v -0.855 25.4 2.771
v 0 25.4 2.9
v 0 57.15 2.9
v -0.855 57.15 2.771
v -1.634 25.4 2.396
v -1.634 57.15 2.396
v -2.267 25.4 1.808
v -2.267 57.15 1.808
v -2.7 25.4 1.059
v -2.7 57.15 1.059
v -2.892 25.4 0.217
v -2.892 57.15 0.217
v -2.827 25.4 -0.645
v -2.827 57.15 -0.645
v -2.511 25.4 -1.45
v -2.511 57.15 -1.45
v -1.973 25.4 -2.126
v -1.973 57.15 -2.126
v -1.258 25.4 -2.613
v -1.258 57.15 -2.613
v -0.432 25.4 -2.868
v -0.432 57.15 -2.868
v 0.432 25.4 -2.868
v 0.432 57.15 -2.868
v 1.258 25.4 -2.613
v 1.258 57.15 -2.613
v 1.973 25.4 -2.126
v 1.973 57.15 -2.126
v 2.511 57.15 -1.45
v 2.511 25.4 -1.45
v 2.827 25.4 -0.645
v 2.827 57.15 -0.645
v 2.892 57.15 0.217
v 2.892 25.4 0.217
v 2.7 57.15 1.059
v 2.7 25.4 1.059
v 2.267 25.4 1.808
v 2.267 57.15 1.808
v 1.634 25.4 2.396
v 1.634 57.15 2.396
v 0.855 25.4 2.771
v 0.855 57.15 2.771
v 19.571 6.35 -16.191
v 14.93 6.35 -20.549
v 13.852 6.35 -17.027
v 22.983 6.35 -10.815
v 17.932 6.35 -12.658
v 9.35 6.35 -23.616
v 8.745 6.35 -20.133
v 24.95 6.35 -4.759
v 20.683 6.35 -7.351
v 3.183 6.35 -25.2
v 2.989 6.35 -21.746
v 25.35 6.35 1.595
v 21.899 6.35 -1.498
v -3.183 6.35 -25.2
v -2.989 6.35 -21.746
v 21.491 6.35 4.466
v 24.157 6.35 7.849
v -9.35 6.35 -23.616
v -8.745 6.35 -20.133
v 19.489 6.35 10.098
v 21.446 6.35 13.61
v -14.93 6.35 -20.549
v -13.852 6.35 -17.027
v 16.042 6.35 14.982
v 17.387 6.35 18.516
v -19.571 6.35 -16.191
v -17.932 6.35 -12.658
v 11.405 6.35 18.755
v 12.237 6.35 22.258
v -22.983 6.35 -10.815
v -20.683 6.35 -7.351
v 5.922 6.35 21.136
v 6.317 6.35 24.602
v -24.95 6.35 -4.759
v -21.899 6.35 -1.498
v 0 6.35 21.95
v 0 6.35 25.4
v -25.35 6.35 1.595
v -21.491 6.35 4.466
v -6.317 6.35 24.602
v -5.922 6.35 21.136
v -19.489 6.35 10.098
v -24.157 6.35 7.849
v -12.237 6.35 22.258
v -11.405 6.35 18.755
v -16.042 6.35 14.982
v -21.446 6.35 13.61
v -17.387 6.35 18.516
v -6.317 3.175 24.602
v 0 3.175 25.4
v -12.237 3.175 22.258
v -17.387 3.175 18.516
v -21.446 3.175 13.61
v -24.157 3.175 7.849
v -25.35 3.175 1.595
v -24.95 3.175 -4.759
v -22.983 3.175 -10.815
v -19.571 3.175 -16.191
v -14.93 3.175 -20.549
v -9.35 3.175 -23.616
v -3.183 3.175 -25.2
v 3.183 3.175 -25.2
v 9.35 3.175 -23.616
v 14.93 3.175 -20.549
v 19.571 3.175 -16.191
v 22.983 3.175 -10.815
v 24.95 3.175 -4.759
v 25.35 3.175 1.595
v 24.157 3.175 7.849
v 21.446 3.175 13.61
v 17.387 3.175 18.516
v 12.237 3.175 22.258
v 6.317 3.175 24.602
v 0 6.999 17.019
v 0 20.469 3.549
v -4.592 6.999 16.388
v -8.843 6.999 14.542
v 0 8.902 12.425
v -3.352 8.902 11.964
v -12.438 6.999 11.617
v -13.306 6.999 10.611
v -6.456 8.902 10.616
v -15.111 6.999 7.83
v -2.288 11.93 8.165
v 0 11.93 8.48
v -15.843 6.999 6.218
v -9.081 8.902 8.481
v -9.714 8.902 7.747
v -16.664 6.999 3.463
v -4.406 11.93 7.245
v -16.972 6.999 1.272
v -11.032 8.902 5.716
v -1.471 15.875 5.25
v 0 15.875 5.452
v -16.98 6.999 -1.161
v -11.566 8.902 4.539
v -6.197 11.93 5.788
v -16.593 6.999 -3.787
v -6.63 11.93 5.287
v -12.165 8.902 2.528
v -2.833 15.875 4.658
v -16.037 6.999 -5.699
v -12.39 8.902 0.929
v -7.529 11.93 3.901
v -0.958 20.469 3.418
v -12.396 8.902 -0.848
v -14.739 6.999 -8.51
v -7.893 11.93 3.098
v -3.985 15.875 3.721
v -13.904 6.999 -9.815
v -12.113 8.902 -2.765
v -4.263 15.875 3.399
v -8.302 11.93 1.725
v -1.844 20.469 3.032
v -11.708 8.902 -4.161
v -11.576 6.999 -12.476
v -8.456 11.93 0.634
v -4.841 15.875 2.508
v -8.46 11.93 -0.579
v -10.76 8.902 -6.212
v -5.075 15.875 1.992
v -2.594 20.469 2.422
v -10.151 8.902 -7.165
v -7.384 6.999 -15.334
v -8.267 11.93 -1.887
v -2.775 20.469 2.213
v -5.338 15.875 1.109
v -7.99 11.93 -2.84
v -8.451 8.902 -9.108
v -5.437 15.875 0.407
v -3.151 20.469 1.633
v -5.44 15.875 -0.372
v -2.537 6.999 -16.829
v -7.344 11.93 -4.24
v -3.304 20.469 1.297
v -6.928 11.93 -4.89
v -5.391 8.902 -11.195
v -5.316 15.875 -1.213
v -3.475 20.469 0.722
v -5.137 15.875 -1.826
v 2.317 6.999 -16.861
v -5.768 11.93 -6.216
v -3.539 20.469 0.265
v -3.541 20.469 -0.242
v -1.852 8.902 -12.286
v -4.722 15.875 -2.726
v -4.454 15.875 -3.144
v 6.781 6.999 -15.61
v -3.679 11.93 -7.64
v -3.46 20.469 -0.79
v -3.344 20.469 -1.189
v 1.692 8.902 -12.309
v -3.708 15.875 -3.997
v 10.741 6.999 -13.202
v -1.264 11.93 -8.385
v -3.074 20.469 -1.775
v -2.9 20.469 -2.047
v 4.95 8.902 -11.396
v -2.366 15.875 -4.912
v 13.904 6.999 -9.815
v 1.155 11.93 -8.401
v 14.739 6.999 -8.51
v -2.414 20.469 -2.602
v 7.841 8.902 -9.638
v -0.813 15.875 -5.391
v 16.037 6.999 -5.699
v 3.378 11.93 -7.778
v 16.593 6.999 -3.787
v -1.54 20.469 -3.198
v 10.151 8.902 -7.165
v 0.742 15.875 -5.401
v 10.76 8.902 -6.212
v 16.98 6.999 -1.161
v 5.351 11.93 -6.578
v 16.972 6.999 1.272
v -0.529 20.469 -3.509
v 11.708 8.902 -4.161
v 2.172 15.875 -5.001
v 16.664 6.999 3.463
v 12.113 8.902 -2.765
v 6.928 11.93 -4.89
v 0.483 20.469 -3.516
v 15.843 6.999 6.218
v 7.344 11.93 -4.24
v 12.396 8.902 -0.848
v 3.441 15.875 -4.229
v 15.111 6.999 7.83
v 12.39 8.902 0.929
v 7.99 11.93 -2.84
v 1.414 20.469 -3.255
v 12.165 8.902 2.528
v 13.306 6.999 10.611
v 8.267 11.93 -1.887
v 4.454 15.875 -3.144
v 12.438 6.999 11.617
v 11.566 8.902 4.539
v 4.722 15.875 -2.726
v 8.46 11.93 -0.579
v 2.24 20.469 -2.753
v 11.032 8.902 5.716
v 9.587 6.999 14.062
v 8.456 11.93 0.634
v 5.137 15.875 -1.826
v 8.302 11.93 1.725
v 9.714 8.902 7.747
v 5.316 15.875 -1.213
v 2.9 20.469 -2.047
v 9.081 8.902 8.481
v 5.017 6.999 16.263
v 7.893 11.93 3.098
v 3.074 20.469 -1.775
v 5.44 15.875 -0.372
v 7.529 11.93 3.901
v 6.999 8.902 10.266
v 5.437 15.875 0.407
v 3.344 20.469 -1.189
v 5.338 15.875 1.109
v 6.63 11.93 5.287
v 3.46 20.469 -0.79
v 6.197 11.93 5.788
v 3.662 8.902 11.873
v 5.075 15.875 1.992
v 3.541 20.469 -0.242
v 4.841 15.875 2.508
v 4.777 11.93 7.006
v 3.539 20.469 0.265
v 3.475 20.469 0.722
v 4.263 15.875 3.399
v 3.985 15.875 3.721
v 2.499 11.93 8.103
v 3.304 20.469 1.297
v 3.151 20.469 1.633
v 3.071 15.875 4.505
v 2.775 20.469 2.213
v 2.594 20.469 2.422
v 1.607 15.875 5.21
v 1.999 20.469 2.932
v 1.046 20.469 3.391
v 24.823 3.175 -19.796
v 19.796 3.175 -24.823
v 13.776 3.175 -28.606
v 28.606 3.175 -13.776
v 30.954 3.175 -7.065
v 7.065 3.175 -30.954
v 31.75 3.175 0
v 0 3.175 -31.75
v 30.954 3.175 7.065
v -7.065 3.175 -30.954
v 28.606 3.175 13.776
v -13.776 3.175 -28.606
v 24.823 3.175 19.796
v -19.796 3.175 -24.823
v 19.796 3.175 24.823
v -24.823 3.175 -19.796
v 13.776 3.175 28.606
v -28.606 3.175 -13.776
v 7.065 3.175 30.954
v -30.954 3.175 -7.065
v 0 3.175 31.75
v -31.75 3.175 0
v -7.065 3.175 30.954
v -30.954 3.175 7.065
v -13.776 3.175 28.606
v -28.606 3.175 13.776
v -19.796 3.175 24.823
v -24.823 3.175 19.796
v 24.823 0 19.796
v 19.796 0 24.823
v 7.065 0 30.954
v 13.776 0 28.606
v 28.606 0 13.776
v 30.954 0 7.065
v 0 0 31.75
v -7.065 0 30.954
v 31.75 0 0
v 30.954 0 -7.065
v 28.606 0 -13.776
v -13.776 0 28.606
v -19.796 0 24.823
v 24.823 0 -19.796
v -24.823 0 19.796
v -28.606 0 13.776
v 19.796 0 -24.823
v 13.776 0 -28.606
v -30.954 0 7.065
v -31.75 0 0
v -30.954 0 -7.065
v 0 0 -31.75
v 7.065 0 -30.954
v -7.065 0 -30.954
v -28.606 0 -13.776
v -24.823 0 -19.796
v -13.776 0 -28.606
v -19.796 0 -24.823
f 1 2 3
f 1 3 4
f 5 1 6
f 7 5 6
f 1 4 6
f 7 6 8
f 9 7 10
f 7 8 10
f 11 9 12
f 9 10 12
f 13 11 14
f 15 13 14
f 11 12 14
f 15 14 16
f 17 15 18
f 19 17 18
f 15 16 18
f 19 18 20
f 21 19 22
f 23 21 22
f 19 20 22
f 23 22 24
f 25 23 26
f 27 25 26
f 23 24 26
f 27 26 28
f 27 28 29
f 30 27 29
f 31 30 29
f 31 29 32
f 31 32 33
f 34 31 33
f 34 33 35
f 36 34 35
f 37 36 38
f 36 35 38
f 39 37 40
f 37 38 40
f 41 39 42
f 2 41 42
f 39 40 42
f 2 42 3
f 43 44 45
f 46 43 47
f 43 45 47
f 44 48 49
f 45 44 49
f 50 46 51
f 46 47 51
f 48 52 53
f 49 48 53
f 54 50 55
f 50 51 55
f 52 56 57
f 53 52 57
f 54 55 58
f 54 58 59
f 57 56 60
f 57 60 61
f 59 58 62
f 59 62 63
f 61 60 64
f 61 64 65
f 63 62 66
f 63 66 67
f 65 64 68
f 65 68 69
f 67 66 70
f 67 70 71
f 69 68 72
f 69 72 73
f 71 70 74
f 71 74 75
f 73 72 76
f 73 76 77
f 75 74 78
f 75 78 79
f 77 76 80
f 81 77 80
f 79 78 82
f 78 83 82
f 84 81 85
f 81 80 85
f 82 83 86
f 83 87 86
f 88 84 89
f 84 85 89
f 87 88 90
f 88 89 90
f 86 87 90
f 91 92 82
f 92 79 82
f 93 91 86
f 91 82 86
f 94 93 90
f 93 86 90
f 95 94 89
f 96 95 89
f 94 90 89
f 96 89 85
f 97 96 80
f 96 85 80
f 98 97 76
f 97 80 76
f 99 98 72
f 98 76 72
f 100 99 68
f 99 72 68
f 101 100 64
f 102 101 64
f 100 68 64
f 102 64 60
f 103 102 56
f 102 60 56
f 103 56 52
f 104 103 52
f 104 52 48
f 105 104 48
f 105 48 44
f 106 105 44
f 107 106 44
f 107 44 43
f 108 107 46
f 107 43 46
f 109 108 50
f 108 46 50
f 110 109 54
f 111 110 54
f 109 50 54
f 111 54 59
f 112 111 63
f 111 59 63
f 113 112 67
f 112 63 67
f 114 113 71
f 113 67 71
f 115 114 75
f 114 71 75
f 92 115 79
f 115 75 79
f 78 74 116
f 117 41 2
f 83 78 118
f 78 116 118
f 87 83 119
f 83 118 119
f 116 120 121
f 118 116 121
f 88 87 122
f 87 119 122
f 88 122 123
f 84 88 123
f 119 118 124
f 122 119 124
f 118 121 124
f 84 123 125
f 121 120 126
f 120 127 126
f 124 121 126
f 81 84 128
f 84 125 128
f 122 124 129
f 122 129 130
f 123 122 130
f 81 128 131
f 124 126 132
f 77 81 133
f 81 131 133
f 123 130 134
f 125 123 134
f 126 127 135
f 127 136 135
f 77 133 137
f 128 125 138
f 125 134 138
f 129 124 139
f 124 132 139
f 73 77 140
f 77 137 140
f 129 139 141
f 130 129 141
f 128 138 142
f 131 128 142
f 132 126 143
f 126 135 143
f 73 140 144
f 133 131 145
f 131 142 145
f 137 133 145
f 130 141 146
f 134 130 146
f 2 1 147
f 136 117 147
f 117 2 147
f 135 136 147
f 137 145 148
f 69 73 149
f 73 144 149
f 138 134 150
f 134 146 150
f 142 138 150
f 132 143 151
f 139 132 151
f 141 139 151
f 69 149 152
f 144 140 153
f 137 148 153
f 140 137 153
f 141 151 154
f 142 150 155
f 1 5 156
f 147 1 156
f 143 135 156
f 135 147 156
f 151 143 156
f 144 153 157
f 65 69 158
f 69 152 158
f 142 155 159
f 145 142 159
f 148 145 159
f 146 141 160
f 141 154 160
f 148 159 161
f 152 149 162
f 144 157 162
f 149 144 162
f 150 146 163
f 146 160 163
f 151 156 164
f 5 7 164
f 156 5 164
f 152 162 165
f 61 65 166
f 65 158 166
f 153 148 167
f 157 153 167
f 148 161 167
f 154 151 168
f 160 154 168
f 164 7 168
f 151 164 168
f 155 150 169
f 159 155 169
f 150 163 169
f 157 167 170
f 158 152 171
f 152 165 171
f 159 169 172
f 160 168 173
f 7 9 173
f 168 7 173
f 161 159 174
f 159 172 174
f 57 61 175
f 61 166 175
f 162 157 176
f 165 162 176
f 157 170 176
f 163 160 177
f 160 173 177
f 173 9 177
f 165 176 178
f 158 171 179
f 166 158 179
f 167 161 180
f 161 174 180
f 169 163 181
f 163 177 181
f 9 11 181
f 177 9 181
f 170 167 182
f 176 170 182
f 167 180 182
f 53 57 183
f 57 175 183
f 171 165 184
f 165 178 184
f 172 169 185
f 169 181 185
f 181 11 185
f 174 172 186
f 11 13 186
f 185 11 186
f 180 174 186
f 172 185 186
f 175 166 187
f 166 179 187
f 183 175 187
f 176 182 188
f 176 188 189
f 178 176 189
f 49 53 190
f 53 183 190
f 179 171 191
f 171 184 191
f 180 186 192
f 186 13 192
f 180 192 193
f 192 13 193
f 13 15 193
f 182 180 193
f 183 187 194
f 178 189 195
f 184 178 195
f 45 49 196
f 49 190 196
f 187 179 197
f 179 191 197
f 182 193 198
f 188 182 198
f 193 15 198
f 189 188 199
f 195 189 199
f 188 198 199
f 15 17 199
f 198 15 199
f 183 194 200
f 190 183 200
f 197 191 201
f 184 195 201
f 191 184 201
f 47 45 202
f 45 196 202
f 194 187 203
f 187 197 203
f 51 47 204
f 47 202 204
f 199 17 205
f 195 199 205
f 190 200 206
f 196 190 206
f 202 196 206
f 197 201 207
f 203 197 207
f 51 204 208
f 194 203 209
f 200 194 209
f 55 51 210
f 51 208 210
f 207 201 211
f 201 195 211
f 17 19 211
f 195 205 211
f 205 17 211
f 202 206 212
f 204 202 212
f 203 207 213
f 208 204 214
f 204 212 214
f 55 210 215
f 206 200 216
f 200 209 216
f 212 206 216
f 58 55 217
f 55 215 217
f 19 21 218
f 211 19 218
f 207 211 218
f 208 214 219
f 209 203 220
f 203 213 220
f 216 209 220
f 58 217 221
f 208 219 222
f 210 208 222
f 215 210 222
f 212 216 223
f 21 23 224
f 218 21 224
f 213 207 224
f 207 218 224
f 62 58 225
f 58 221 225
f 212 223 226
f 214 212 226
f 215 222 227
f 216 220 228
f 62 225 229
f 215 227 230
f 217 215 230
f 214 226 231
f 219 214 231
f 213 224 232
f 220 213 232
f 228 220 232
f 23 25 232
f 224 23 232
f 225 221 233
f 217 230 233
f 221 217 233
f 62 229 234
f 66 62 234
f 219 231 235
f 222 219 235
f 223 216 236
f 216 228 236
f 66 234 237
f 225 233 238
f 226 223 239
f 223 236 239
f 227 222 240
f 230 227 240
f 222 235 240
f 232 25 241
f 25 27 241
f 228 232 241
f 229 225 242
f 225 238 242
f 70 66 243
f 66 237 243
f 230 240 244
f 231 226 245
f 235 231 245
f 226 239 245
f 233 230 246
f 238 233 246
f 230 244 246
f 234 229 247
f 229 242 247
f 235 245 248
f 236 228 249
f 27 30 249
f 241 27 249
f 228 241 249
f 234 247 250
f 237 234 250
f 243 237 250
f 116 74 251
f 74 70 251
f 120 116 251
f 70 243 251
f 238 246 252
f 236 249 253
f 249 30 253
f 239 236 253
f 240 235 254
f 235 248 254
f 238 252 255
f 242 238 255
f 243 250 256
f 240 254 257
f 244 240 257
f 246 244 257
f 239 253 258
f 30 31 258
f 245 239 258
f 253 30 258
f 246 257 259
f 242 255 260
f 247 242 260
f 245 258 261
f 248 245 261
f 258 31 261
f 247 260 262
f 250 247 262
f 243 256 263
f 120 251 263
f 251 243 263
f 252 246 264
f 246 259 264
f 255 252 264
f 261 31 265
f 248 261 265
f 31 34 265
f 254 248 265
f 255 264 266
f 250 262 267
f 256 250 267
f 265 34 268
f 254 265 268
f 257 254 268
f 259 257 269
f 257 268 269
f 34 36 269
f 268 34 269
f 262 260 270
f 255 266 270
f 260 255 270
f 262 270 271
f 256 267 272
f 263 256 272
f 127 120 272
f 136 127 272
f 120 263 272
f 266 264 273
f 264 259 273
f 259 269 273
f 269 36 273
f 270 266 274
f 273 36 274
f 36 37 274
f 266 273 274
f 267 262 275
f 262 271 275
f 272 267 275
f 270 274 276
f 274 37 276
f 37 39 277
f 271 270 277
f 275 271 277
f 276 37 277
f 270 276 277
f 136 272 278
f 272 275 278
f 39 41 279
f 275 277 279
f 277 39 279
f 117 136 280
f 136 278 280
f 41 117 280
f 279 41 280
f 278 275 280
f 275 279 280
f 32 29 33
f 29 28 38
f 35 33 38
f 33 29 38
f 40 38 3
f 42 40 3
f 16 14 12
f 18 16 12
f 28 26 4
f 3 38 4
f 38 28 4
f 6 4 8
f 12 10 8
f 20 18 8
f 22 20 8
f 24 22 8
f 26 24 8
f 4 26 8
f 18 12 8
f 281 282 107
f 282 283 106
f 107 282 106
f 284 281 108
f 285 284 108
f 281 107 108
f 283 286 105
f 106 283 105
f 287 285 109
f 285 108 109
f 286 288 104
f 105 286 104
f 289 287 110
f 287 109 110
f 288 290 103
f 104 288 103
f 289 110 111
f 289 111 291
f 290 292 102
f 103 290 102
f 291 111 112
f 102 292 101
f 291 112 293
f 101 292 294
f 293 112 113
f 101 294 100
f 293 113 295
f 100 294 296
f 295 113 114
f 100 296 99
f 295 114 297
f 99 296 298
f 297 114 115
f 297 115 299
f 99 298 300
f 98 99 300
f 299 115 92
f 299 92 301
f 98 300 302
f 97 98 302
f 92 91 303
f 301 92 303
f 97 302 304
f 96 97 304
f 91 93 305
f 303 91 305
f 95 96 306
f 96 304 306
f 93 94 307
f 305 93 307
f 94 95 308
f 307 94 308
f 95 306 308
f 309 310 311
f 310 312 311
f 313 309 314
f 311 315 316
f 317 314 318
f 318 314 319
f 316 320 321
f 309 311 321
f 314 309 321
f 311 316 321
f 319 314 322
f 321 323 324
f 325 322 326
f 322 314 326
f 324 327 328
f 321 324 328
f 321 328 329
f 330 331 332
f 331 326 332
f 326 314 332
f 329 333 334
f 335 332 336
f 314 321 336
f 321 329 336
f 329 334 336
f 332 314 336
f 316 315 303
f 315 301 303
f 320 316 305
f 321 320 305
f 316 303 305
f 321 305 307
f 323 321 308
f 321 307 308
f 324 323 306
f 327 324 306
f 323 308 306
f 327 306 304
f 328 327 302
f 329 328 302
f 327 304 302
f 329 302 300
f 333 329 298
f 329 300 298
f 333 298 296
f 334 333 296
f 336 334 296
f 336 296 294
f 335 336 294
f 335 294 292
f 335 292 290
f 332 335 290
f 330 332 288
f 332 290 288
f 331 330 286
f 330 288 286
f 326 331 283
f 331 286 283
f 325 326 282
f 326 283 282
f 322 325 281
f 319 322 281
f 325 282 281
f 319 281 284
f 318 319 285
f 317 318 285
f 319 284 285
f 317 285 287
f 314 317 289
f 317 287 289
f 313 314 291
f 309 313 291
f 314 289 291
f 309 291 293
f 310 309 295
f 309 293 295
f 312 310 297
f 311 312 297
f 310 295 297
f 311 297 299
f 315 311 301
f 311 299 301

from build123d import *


with BuildPart() as part:
    # Sketch1 → Revolve1 (revolve)
    with BuildSketch(Plane.XY, mode=Mode.PRIVATE) as revolve1_sk:
        with BuildLine():
            Line((0, 0), (31.75, 0))
            Line((31.75, 0), (31.75, 3.175))
            Line((31.75, 3.175), (25.4, 3.175))
            Line((25.4, 3.175), (25.4, 6.35))
            Line((25.4, 6.35), (21.95, 6.35))
            ThreePointArc((21.95, 6.35), (8.479615818, 11.929615818), (2.9, 25.4))
            Line((2.9, 25.4), (2.9, 57.15))
            Line((2.9, 57.15), (0, 57.15))
            Line((0, 57.15), (0, 0))
        make_face()
    revolve(revolve1_sk.sketch.rotate(Axis((0, 0, 0), (0, -1, 0)), 90), axis=Axis((0, 0, 0), (0, -1, 0)))


solid = part.part
